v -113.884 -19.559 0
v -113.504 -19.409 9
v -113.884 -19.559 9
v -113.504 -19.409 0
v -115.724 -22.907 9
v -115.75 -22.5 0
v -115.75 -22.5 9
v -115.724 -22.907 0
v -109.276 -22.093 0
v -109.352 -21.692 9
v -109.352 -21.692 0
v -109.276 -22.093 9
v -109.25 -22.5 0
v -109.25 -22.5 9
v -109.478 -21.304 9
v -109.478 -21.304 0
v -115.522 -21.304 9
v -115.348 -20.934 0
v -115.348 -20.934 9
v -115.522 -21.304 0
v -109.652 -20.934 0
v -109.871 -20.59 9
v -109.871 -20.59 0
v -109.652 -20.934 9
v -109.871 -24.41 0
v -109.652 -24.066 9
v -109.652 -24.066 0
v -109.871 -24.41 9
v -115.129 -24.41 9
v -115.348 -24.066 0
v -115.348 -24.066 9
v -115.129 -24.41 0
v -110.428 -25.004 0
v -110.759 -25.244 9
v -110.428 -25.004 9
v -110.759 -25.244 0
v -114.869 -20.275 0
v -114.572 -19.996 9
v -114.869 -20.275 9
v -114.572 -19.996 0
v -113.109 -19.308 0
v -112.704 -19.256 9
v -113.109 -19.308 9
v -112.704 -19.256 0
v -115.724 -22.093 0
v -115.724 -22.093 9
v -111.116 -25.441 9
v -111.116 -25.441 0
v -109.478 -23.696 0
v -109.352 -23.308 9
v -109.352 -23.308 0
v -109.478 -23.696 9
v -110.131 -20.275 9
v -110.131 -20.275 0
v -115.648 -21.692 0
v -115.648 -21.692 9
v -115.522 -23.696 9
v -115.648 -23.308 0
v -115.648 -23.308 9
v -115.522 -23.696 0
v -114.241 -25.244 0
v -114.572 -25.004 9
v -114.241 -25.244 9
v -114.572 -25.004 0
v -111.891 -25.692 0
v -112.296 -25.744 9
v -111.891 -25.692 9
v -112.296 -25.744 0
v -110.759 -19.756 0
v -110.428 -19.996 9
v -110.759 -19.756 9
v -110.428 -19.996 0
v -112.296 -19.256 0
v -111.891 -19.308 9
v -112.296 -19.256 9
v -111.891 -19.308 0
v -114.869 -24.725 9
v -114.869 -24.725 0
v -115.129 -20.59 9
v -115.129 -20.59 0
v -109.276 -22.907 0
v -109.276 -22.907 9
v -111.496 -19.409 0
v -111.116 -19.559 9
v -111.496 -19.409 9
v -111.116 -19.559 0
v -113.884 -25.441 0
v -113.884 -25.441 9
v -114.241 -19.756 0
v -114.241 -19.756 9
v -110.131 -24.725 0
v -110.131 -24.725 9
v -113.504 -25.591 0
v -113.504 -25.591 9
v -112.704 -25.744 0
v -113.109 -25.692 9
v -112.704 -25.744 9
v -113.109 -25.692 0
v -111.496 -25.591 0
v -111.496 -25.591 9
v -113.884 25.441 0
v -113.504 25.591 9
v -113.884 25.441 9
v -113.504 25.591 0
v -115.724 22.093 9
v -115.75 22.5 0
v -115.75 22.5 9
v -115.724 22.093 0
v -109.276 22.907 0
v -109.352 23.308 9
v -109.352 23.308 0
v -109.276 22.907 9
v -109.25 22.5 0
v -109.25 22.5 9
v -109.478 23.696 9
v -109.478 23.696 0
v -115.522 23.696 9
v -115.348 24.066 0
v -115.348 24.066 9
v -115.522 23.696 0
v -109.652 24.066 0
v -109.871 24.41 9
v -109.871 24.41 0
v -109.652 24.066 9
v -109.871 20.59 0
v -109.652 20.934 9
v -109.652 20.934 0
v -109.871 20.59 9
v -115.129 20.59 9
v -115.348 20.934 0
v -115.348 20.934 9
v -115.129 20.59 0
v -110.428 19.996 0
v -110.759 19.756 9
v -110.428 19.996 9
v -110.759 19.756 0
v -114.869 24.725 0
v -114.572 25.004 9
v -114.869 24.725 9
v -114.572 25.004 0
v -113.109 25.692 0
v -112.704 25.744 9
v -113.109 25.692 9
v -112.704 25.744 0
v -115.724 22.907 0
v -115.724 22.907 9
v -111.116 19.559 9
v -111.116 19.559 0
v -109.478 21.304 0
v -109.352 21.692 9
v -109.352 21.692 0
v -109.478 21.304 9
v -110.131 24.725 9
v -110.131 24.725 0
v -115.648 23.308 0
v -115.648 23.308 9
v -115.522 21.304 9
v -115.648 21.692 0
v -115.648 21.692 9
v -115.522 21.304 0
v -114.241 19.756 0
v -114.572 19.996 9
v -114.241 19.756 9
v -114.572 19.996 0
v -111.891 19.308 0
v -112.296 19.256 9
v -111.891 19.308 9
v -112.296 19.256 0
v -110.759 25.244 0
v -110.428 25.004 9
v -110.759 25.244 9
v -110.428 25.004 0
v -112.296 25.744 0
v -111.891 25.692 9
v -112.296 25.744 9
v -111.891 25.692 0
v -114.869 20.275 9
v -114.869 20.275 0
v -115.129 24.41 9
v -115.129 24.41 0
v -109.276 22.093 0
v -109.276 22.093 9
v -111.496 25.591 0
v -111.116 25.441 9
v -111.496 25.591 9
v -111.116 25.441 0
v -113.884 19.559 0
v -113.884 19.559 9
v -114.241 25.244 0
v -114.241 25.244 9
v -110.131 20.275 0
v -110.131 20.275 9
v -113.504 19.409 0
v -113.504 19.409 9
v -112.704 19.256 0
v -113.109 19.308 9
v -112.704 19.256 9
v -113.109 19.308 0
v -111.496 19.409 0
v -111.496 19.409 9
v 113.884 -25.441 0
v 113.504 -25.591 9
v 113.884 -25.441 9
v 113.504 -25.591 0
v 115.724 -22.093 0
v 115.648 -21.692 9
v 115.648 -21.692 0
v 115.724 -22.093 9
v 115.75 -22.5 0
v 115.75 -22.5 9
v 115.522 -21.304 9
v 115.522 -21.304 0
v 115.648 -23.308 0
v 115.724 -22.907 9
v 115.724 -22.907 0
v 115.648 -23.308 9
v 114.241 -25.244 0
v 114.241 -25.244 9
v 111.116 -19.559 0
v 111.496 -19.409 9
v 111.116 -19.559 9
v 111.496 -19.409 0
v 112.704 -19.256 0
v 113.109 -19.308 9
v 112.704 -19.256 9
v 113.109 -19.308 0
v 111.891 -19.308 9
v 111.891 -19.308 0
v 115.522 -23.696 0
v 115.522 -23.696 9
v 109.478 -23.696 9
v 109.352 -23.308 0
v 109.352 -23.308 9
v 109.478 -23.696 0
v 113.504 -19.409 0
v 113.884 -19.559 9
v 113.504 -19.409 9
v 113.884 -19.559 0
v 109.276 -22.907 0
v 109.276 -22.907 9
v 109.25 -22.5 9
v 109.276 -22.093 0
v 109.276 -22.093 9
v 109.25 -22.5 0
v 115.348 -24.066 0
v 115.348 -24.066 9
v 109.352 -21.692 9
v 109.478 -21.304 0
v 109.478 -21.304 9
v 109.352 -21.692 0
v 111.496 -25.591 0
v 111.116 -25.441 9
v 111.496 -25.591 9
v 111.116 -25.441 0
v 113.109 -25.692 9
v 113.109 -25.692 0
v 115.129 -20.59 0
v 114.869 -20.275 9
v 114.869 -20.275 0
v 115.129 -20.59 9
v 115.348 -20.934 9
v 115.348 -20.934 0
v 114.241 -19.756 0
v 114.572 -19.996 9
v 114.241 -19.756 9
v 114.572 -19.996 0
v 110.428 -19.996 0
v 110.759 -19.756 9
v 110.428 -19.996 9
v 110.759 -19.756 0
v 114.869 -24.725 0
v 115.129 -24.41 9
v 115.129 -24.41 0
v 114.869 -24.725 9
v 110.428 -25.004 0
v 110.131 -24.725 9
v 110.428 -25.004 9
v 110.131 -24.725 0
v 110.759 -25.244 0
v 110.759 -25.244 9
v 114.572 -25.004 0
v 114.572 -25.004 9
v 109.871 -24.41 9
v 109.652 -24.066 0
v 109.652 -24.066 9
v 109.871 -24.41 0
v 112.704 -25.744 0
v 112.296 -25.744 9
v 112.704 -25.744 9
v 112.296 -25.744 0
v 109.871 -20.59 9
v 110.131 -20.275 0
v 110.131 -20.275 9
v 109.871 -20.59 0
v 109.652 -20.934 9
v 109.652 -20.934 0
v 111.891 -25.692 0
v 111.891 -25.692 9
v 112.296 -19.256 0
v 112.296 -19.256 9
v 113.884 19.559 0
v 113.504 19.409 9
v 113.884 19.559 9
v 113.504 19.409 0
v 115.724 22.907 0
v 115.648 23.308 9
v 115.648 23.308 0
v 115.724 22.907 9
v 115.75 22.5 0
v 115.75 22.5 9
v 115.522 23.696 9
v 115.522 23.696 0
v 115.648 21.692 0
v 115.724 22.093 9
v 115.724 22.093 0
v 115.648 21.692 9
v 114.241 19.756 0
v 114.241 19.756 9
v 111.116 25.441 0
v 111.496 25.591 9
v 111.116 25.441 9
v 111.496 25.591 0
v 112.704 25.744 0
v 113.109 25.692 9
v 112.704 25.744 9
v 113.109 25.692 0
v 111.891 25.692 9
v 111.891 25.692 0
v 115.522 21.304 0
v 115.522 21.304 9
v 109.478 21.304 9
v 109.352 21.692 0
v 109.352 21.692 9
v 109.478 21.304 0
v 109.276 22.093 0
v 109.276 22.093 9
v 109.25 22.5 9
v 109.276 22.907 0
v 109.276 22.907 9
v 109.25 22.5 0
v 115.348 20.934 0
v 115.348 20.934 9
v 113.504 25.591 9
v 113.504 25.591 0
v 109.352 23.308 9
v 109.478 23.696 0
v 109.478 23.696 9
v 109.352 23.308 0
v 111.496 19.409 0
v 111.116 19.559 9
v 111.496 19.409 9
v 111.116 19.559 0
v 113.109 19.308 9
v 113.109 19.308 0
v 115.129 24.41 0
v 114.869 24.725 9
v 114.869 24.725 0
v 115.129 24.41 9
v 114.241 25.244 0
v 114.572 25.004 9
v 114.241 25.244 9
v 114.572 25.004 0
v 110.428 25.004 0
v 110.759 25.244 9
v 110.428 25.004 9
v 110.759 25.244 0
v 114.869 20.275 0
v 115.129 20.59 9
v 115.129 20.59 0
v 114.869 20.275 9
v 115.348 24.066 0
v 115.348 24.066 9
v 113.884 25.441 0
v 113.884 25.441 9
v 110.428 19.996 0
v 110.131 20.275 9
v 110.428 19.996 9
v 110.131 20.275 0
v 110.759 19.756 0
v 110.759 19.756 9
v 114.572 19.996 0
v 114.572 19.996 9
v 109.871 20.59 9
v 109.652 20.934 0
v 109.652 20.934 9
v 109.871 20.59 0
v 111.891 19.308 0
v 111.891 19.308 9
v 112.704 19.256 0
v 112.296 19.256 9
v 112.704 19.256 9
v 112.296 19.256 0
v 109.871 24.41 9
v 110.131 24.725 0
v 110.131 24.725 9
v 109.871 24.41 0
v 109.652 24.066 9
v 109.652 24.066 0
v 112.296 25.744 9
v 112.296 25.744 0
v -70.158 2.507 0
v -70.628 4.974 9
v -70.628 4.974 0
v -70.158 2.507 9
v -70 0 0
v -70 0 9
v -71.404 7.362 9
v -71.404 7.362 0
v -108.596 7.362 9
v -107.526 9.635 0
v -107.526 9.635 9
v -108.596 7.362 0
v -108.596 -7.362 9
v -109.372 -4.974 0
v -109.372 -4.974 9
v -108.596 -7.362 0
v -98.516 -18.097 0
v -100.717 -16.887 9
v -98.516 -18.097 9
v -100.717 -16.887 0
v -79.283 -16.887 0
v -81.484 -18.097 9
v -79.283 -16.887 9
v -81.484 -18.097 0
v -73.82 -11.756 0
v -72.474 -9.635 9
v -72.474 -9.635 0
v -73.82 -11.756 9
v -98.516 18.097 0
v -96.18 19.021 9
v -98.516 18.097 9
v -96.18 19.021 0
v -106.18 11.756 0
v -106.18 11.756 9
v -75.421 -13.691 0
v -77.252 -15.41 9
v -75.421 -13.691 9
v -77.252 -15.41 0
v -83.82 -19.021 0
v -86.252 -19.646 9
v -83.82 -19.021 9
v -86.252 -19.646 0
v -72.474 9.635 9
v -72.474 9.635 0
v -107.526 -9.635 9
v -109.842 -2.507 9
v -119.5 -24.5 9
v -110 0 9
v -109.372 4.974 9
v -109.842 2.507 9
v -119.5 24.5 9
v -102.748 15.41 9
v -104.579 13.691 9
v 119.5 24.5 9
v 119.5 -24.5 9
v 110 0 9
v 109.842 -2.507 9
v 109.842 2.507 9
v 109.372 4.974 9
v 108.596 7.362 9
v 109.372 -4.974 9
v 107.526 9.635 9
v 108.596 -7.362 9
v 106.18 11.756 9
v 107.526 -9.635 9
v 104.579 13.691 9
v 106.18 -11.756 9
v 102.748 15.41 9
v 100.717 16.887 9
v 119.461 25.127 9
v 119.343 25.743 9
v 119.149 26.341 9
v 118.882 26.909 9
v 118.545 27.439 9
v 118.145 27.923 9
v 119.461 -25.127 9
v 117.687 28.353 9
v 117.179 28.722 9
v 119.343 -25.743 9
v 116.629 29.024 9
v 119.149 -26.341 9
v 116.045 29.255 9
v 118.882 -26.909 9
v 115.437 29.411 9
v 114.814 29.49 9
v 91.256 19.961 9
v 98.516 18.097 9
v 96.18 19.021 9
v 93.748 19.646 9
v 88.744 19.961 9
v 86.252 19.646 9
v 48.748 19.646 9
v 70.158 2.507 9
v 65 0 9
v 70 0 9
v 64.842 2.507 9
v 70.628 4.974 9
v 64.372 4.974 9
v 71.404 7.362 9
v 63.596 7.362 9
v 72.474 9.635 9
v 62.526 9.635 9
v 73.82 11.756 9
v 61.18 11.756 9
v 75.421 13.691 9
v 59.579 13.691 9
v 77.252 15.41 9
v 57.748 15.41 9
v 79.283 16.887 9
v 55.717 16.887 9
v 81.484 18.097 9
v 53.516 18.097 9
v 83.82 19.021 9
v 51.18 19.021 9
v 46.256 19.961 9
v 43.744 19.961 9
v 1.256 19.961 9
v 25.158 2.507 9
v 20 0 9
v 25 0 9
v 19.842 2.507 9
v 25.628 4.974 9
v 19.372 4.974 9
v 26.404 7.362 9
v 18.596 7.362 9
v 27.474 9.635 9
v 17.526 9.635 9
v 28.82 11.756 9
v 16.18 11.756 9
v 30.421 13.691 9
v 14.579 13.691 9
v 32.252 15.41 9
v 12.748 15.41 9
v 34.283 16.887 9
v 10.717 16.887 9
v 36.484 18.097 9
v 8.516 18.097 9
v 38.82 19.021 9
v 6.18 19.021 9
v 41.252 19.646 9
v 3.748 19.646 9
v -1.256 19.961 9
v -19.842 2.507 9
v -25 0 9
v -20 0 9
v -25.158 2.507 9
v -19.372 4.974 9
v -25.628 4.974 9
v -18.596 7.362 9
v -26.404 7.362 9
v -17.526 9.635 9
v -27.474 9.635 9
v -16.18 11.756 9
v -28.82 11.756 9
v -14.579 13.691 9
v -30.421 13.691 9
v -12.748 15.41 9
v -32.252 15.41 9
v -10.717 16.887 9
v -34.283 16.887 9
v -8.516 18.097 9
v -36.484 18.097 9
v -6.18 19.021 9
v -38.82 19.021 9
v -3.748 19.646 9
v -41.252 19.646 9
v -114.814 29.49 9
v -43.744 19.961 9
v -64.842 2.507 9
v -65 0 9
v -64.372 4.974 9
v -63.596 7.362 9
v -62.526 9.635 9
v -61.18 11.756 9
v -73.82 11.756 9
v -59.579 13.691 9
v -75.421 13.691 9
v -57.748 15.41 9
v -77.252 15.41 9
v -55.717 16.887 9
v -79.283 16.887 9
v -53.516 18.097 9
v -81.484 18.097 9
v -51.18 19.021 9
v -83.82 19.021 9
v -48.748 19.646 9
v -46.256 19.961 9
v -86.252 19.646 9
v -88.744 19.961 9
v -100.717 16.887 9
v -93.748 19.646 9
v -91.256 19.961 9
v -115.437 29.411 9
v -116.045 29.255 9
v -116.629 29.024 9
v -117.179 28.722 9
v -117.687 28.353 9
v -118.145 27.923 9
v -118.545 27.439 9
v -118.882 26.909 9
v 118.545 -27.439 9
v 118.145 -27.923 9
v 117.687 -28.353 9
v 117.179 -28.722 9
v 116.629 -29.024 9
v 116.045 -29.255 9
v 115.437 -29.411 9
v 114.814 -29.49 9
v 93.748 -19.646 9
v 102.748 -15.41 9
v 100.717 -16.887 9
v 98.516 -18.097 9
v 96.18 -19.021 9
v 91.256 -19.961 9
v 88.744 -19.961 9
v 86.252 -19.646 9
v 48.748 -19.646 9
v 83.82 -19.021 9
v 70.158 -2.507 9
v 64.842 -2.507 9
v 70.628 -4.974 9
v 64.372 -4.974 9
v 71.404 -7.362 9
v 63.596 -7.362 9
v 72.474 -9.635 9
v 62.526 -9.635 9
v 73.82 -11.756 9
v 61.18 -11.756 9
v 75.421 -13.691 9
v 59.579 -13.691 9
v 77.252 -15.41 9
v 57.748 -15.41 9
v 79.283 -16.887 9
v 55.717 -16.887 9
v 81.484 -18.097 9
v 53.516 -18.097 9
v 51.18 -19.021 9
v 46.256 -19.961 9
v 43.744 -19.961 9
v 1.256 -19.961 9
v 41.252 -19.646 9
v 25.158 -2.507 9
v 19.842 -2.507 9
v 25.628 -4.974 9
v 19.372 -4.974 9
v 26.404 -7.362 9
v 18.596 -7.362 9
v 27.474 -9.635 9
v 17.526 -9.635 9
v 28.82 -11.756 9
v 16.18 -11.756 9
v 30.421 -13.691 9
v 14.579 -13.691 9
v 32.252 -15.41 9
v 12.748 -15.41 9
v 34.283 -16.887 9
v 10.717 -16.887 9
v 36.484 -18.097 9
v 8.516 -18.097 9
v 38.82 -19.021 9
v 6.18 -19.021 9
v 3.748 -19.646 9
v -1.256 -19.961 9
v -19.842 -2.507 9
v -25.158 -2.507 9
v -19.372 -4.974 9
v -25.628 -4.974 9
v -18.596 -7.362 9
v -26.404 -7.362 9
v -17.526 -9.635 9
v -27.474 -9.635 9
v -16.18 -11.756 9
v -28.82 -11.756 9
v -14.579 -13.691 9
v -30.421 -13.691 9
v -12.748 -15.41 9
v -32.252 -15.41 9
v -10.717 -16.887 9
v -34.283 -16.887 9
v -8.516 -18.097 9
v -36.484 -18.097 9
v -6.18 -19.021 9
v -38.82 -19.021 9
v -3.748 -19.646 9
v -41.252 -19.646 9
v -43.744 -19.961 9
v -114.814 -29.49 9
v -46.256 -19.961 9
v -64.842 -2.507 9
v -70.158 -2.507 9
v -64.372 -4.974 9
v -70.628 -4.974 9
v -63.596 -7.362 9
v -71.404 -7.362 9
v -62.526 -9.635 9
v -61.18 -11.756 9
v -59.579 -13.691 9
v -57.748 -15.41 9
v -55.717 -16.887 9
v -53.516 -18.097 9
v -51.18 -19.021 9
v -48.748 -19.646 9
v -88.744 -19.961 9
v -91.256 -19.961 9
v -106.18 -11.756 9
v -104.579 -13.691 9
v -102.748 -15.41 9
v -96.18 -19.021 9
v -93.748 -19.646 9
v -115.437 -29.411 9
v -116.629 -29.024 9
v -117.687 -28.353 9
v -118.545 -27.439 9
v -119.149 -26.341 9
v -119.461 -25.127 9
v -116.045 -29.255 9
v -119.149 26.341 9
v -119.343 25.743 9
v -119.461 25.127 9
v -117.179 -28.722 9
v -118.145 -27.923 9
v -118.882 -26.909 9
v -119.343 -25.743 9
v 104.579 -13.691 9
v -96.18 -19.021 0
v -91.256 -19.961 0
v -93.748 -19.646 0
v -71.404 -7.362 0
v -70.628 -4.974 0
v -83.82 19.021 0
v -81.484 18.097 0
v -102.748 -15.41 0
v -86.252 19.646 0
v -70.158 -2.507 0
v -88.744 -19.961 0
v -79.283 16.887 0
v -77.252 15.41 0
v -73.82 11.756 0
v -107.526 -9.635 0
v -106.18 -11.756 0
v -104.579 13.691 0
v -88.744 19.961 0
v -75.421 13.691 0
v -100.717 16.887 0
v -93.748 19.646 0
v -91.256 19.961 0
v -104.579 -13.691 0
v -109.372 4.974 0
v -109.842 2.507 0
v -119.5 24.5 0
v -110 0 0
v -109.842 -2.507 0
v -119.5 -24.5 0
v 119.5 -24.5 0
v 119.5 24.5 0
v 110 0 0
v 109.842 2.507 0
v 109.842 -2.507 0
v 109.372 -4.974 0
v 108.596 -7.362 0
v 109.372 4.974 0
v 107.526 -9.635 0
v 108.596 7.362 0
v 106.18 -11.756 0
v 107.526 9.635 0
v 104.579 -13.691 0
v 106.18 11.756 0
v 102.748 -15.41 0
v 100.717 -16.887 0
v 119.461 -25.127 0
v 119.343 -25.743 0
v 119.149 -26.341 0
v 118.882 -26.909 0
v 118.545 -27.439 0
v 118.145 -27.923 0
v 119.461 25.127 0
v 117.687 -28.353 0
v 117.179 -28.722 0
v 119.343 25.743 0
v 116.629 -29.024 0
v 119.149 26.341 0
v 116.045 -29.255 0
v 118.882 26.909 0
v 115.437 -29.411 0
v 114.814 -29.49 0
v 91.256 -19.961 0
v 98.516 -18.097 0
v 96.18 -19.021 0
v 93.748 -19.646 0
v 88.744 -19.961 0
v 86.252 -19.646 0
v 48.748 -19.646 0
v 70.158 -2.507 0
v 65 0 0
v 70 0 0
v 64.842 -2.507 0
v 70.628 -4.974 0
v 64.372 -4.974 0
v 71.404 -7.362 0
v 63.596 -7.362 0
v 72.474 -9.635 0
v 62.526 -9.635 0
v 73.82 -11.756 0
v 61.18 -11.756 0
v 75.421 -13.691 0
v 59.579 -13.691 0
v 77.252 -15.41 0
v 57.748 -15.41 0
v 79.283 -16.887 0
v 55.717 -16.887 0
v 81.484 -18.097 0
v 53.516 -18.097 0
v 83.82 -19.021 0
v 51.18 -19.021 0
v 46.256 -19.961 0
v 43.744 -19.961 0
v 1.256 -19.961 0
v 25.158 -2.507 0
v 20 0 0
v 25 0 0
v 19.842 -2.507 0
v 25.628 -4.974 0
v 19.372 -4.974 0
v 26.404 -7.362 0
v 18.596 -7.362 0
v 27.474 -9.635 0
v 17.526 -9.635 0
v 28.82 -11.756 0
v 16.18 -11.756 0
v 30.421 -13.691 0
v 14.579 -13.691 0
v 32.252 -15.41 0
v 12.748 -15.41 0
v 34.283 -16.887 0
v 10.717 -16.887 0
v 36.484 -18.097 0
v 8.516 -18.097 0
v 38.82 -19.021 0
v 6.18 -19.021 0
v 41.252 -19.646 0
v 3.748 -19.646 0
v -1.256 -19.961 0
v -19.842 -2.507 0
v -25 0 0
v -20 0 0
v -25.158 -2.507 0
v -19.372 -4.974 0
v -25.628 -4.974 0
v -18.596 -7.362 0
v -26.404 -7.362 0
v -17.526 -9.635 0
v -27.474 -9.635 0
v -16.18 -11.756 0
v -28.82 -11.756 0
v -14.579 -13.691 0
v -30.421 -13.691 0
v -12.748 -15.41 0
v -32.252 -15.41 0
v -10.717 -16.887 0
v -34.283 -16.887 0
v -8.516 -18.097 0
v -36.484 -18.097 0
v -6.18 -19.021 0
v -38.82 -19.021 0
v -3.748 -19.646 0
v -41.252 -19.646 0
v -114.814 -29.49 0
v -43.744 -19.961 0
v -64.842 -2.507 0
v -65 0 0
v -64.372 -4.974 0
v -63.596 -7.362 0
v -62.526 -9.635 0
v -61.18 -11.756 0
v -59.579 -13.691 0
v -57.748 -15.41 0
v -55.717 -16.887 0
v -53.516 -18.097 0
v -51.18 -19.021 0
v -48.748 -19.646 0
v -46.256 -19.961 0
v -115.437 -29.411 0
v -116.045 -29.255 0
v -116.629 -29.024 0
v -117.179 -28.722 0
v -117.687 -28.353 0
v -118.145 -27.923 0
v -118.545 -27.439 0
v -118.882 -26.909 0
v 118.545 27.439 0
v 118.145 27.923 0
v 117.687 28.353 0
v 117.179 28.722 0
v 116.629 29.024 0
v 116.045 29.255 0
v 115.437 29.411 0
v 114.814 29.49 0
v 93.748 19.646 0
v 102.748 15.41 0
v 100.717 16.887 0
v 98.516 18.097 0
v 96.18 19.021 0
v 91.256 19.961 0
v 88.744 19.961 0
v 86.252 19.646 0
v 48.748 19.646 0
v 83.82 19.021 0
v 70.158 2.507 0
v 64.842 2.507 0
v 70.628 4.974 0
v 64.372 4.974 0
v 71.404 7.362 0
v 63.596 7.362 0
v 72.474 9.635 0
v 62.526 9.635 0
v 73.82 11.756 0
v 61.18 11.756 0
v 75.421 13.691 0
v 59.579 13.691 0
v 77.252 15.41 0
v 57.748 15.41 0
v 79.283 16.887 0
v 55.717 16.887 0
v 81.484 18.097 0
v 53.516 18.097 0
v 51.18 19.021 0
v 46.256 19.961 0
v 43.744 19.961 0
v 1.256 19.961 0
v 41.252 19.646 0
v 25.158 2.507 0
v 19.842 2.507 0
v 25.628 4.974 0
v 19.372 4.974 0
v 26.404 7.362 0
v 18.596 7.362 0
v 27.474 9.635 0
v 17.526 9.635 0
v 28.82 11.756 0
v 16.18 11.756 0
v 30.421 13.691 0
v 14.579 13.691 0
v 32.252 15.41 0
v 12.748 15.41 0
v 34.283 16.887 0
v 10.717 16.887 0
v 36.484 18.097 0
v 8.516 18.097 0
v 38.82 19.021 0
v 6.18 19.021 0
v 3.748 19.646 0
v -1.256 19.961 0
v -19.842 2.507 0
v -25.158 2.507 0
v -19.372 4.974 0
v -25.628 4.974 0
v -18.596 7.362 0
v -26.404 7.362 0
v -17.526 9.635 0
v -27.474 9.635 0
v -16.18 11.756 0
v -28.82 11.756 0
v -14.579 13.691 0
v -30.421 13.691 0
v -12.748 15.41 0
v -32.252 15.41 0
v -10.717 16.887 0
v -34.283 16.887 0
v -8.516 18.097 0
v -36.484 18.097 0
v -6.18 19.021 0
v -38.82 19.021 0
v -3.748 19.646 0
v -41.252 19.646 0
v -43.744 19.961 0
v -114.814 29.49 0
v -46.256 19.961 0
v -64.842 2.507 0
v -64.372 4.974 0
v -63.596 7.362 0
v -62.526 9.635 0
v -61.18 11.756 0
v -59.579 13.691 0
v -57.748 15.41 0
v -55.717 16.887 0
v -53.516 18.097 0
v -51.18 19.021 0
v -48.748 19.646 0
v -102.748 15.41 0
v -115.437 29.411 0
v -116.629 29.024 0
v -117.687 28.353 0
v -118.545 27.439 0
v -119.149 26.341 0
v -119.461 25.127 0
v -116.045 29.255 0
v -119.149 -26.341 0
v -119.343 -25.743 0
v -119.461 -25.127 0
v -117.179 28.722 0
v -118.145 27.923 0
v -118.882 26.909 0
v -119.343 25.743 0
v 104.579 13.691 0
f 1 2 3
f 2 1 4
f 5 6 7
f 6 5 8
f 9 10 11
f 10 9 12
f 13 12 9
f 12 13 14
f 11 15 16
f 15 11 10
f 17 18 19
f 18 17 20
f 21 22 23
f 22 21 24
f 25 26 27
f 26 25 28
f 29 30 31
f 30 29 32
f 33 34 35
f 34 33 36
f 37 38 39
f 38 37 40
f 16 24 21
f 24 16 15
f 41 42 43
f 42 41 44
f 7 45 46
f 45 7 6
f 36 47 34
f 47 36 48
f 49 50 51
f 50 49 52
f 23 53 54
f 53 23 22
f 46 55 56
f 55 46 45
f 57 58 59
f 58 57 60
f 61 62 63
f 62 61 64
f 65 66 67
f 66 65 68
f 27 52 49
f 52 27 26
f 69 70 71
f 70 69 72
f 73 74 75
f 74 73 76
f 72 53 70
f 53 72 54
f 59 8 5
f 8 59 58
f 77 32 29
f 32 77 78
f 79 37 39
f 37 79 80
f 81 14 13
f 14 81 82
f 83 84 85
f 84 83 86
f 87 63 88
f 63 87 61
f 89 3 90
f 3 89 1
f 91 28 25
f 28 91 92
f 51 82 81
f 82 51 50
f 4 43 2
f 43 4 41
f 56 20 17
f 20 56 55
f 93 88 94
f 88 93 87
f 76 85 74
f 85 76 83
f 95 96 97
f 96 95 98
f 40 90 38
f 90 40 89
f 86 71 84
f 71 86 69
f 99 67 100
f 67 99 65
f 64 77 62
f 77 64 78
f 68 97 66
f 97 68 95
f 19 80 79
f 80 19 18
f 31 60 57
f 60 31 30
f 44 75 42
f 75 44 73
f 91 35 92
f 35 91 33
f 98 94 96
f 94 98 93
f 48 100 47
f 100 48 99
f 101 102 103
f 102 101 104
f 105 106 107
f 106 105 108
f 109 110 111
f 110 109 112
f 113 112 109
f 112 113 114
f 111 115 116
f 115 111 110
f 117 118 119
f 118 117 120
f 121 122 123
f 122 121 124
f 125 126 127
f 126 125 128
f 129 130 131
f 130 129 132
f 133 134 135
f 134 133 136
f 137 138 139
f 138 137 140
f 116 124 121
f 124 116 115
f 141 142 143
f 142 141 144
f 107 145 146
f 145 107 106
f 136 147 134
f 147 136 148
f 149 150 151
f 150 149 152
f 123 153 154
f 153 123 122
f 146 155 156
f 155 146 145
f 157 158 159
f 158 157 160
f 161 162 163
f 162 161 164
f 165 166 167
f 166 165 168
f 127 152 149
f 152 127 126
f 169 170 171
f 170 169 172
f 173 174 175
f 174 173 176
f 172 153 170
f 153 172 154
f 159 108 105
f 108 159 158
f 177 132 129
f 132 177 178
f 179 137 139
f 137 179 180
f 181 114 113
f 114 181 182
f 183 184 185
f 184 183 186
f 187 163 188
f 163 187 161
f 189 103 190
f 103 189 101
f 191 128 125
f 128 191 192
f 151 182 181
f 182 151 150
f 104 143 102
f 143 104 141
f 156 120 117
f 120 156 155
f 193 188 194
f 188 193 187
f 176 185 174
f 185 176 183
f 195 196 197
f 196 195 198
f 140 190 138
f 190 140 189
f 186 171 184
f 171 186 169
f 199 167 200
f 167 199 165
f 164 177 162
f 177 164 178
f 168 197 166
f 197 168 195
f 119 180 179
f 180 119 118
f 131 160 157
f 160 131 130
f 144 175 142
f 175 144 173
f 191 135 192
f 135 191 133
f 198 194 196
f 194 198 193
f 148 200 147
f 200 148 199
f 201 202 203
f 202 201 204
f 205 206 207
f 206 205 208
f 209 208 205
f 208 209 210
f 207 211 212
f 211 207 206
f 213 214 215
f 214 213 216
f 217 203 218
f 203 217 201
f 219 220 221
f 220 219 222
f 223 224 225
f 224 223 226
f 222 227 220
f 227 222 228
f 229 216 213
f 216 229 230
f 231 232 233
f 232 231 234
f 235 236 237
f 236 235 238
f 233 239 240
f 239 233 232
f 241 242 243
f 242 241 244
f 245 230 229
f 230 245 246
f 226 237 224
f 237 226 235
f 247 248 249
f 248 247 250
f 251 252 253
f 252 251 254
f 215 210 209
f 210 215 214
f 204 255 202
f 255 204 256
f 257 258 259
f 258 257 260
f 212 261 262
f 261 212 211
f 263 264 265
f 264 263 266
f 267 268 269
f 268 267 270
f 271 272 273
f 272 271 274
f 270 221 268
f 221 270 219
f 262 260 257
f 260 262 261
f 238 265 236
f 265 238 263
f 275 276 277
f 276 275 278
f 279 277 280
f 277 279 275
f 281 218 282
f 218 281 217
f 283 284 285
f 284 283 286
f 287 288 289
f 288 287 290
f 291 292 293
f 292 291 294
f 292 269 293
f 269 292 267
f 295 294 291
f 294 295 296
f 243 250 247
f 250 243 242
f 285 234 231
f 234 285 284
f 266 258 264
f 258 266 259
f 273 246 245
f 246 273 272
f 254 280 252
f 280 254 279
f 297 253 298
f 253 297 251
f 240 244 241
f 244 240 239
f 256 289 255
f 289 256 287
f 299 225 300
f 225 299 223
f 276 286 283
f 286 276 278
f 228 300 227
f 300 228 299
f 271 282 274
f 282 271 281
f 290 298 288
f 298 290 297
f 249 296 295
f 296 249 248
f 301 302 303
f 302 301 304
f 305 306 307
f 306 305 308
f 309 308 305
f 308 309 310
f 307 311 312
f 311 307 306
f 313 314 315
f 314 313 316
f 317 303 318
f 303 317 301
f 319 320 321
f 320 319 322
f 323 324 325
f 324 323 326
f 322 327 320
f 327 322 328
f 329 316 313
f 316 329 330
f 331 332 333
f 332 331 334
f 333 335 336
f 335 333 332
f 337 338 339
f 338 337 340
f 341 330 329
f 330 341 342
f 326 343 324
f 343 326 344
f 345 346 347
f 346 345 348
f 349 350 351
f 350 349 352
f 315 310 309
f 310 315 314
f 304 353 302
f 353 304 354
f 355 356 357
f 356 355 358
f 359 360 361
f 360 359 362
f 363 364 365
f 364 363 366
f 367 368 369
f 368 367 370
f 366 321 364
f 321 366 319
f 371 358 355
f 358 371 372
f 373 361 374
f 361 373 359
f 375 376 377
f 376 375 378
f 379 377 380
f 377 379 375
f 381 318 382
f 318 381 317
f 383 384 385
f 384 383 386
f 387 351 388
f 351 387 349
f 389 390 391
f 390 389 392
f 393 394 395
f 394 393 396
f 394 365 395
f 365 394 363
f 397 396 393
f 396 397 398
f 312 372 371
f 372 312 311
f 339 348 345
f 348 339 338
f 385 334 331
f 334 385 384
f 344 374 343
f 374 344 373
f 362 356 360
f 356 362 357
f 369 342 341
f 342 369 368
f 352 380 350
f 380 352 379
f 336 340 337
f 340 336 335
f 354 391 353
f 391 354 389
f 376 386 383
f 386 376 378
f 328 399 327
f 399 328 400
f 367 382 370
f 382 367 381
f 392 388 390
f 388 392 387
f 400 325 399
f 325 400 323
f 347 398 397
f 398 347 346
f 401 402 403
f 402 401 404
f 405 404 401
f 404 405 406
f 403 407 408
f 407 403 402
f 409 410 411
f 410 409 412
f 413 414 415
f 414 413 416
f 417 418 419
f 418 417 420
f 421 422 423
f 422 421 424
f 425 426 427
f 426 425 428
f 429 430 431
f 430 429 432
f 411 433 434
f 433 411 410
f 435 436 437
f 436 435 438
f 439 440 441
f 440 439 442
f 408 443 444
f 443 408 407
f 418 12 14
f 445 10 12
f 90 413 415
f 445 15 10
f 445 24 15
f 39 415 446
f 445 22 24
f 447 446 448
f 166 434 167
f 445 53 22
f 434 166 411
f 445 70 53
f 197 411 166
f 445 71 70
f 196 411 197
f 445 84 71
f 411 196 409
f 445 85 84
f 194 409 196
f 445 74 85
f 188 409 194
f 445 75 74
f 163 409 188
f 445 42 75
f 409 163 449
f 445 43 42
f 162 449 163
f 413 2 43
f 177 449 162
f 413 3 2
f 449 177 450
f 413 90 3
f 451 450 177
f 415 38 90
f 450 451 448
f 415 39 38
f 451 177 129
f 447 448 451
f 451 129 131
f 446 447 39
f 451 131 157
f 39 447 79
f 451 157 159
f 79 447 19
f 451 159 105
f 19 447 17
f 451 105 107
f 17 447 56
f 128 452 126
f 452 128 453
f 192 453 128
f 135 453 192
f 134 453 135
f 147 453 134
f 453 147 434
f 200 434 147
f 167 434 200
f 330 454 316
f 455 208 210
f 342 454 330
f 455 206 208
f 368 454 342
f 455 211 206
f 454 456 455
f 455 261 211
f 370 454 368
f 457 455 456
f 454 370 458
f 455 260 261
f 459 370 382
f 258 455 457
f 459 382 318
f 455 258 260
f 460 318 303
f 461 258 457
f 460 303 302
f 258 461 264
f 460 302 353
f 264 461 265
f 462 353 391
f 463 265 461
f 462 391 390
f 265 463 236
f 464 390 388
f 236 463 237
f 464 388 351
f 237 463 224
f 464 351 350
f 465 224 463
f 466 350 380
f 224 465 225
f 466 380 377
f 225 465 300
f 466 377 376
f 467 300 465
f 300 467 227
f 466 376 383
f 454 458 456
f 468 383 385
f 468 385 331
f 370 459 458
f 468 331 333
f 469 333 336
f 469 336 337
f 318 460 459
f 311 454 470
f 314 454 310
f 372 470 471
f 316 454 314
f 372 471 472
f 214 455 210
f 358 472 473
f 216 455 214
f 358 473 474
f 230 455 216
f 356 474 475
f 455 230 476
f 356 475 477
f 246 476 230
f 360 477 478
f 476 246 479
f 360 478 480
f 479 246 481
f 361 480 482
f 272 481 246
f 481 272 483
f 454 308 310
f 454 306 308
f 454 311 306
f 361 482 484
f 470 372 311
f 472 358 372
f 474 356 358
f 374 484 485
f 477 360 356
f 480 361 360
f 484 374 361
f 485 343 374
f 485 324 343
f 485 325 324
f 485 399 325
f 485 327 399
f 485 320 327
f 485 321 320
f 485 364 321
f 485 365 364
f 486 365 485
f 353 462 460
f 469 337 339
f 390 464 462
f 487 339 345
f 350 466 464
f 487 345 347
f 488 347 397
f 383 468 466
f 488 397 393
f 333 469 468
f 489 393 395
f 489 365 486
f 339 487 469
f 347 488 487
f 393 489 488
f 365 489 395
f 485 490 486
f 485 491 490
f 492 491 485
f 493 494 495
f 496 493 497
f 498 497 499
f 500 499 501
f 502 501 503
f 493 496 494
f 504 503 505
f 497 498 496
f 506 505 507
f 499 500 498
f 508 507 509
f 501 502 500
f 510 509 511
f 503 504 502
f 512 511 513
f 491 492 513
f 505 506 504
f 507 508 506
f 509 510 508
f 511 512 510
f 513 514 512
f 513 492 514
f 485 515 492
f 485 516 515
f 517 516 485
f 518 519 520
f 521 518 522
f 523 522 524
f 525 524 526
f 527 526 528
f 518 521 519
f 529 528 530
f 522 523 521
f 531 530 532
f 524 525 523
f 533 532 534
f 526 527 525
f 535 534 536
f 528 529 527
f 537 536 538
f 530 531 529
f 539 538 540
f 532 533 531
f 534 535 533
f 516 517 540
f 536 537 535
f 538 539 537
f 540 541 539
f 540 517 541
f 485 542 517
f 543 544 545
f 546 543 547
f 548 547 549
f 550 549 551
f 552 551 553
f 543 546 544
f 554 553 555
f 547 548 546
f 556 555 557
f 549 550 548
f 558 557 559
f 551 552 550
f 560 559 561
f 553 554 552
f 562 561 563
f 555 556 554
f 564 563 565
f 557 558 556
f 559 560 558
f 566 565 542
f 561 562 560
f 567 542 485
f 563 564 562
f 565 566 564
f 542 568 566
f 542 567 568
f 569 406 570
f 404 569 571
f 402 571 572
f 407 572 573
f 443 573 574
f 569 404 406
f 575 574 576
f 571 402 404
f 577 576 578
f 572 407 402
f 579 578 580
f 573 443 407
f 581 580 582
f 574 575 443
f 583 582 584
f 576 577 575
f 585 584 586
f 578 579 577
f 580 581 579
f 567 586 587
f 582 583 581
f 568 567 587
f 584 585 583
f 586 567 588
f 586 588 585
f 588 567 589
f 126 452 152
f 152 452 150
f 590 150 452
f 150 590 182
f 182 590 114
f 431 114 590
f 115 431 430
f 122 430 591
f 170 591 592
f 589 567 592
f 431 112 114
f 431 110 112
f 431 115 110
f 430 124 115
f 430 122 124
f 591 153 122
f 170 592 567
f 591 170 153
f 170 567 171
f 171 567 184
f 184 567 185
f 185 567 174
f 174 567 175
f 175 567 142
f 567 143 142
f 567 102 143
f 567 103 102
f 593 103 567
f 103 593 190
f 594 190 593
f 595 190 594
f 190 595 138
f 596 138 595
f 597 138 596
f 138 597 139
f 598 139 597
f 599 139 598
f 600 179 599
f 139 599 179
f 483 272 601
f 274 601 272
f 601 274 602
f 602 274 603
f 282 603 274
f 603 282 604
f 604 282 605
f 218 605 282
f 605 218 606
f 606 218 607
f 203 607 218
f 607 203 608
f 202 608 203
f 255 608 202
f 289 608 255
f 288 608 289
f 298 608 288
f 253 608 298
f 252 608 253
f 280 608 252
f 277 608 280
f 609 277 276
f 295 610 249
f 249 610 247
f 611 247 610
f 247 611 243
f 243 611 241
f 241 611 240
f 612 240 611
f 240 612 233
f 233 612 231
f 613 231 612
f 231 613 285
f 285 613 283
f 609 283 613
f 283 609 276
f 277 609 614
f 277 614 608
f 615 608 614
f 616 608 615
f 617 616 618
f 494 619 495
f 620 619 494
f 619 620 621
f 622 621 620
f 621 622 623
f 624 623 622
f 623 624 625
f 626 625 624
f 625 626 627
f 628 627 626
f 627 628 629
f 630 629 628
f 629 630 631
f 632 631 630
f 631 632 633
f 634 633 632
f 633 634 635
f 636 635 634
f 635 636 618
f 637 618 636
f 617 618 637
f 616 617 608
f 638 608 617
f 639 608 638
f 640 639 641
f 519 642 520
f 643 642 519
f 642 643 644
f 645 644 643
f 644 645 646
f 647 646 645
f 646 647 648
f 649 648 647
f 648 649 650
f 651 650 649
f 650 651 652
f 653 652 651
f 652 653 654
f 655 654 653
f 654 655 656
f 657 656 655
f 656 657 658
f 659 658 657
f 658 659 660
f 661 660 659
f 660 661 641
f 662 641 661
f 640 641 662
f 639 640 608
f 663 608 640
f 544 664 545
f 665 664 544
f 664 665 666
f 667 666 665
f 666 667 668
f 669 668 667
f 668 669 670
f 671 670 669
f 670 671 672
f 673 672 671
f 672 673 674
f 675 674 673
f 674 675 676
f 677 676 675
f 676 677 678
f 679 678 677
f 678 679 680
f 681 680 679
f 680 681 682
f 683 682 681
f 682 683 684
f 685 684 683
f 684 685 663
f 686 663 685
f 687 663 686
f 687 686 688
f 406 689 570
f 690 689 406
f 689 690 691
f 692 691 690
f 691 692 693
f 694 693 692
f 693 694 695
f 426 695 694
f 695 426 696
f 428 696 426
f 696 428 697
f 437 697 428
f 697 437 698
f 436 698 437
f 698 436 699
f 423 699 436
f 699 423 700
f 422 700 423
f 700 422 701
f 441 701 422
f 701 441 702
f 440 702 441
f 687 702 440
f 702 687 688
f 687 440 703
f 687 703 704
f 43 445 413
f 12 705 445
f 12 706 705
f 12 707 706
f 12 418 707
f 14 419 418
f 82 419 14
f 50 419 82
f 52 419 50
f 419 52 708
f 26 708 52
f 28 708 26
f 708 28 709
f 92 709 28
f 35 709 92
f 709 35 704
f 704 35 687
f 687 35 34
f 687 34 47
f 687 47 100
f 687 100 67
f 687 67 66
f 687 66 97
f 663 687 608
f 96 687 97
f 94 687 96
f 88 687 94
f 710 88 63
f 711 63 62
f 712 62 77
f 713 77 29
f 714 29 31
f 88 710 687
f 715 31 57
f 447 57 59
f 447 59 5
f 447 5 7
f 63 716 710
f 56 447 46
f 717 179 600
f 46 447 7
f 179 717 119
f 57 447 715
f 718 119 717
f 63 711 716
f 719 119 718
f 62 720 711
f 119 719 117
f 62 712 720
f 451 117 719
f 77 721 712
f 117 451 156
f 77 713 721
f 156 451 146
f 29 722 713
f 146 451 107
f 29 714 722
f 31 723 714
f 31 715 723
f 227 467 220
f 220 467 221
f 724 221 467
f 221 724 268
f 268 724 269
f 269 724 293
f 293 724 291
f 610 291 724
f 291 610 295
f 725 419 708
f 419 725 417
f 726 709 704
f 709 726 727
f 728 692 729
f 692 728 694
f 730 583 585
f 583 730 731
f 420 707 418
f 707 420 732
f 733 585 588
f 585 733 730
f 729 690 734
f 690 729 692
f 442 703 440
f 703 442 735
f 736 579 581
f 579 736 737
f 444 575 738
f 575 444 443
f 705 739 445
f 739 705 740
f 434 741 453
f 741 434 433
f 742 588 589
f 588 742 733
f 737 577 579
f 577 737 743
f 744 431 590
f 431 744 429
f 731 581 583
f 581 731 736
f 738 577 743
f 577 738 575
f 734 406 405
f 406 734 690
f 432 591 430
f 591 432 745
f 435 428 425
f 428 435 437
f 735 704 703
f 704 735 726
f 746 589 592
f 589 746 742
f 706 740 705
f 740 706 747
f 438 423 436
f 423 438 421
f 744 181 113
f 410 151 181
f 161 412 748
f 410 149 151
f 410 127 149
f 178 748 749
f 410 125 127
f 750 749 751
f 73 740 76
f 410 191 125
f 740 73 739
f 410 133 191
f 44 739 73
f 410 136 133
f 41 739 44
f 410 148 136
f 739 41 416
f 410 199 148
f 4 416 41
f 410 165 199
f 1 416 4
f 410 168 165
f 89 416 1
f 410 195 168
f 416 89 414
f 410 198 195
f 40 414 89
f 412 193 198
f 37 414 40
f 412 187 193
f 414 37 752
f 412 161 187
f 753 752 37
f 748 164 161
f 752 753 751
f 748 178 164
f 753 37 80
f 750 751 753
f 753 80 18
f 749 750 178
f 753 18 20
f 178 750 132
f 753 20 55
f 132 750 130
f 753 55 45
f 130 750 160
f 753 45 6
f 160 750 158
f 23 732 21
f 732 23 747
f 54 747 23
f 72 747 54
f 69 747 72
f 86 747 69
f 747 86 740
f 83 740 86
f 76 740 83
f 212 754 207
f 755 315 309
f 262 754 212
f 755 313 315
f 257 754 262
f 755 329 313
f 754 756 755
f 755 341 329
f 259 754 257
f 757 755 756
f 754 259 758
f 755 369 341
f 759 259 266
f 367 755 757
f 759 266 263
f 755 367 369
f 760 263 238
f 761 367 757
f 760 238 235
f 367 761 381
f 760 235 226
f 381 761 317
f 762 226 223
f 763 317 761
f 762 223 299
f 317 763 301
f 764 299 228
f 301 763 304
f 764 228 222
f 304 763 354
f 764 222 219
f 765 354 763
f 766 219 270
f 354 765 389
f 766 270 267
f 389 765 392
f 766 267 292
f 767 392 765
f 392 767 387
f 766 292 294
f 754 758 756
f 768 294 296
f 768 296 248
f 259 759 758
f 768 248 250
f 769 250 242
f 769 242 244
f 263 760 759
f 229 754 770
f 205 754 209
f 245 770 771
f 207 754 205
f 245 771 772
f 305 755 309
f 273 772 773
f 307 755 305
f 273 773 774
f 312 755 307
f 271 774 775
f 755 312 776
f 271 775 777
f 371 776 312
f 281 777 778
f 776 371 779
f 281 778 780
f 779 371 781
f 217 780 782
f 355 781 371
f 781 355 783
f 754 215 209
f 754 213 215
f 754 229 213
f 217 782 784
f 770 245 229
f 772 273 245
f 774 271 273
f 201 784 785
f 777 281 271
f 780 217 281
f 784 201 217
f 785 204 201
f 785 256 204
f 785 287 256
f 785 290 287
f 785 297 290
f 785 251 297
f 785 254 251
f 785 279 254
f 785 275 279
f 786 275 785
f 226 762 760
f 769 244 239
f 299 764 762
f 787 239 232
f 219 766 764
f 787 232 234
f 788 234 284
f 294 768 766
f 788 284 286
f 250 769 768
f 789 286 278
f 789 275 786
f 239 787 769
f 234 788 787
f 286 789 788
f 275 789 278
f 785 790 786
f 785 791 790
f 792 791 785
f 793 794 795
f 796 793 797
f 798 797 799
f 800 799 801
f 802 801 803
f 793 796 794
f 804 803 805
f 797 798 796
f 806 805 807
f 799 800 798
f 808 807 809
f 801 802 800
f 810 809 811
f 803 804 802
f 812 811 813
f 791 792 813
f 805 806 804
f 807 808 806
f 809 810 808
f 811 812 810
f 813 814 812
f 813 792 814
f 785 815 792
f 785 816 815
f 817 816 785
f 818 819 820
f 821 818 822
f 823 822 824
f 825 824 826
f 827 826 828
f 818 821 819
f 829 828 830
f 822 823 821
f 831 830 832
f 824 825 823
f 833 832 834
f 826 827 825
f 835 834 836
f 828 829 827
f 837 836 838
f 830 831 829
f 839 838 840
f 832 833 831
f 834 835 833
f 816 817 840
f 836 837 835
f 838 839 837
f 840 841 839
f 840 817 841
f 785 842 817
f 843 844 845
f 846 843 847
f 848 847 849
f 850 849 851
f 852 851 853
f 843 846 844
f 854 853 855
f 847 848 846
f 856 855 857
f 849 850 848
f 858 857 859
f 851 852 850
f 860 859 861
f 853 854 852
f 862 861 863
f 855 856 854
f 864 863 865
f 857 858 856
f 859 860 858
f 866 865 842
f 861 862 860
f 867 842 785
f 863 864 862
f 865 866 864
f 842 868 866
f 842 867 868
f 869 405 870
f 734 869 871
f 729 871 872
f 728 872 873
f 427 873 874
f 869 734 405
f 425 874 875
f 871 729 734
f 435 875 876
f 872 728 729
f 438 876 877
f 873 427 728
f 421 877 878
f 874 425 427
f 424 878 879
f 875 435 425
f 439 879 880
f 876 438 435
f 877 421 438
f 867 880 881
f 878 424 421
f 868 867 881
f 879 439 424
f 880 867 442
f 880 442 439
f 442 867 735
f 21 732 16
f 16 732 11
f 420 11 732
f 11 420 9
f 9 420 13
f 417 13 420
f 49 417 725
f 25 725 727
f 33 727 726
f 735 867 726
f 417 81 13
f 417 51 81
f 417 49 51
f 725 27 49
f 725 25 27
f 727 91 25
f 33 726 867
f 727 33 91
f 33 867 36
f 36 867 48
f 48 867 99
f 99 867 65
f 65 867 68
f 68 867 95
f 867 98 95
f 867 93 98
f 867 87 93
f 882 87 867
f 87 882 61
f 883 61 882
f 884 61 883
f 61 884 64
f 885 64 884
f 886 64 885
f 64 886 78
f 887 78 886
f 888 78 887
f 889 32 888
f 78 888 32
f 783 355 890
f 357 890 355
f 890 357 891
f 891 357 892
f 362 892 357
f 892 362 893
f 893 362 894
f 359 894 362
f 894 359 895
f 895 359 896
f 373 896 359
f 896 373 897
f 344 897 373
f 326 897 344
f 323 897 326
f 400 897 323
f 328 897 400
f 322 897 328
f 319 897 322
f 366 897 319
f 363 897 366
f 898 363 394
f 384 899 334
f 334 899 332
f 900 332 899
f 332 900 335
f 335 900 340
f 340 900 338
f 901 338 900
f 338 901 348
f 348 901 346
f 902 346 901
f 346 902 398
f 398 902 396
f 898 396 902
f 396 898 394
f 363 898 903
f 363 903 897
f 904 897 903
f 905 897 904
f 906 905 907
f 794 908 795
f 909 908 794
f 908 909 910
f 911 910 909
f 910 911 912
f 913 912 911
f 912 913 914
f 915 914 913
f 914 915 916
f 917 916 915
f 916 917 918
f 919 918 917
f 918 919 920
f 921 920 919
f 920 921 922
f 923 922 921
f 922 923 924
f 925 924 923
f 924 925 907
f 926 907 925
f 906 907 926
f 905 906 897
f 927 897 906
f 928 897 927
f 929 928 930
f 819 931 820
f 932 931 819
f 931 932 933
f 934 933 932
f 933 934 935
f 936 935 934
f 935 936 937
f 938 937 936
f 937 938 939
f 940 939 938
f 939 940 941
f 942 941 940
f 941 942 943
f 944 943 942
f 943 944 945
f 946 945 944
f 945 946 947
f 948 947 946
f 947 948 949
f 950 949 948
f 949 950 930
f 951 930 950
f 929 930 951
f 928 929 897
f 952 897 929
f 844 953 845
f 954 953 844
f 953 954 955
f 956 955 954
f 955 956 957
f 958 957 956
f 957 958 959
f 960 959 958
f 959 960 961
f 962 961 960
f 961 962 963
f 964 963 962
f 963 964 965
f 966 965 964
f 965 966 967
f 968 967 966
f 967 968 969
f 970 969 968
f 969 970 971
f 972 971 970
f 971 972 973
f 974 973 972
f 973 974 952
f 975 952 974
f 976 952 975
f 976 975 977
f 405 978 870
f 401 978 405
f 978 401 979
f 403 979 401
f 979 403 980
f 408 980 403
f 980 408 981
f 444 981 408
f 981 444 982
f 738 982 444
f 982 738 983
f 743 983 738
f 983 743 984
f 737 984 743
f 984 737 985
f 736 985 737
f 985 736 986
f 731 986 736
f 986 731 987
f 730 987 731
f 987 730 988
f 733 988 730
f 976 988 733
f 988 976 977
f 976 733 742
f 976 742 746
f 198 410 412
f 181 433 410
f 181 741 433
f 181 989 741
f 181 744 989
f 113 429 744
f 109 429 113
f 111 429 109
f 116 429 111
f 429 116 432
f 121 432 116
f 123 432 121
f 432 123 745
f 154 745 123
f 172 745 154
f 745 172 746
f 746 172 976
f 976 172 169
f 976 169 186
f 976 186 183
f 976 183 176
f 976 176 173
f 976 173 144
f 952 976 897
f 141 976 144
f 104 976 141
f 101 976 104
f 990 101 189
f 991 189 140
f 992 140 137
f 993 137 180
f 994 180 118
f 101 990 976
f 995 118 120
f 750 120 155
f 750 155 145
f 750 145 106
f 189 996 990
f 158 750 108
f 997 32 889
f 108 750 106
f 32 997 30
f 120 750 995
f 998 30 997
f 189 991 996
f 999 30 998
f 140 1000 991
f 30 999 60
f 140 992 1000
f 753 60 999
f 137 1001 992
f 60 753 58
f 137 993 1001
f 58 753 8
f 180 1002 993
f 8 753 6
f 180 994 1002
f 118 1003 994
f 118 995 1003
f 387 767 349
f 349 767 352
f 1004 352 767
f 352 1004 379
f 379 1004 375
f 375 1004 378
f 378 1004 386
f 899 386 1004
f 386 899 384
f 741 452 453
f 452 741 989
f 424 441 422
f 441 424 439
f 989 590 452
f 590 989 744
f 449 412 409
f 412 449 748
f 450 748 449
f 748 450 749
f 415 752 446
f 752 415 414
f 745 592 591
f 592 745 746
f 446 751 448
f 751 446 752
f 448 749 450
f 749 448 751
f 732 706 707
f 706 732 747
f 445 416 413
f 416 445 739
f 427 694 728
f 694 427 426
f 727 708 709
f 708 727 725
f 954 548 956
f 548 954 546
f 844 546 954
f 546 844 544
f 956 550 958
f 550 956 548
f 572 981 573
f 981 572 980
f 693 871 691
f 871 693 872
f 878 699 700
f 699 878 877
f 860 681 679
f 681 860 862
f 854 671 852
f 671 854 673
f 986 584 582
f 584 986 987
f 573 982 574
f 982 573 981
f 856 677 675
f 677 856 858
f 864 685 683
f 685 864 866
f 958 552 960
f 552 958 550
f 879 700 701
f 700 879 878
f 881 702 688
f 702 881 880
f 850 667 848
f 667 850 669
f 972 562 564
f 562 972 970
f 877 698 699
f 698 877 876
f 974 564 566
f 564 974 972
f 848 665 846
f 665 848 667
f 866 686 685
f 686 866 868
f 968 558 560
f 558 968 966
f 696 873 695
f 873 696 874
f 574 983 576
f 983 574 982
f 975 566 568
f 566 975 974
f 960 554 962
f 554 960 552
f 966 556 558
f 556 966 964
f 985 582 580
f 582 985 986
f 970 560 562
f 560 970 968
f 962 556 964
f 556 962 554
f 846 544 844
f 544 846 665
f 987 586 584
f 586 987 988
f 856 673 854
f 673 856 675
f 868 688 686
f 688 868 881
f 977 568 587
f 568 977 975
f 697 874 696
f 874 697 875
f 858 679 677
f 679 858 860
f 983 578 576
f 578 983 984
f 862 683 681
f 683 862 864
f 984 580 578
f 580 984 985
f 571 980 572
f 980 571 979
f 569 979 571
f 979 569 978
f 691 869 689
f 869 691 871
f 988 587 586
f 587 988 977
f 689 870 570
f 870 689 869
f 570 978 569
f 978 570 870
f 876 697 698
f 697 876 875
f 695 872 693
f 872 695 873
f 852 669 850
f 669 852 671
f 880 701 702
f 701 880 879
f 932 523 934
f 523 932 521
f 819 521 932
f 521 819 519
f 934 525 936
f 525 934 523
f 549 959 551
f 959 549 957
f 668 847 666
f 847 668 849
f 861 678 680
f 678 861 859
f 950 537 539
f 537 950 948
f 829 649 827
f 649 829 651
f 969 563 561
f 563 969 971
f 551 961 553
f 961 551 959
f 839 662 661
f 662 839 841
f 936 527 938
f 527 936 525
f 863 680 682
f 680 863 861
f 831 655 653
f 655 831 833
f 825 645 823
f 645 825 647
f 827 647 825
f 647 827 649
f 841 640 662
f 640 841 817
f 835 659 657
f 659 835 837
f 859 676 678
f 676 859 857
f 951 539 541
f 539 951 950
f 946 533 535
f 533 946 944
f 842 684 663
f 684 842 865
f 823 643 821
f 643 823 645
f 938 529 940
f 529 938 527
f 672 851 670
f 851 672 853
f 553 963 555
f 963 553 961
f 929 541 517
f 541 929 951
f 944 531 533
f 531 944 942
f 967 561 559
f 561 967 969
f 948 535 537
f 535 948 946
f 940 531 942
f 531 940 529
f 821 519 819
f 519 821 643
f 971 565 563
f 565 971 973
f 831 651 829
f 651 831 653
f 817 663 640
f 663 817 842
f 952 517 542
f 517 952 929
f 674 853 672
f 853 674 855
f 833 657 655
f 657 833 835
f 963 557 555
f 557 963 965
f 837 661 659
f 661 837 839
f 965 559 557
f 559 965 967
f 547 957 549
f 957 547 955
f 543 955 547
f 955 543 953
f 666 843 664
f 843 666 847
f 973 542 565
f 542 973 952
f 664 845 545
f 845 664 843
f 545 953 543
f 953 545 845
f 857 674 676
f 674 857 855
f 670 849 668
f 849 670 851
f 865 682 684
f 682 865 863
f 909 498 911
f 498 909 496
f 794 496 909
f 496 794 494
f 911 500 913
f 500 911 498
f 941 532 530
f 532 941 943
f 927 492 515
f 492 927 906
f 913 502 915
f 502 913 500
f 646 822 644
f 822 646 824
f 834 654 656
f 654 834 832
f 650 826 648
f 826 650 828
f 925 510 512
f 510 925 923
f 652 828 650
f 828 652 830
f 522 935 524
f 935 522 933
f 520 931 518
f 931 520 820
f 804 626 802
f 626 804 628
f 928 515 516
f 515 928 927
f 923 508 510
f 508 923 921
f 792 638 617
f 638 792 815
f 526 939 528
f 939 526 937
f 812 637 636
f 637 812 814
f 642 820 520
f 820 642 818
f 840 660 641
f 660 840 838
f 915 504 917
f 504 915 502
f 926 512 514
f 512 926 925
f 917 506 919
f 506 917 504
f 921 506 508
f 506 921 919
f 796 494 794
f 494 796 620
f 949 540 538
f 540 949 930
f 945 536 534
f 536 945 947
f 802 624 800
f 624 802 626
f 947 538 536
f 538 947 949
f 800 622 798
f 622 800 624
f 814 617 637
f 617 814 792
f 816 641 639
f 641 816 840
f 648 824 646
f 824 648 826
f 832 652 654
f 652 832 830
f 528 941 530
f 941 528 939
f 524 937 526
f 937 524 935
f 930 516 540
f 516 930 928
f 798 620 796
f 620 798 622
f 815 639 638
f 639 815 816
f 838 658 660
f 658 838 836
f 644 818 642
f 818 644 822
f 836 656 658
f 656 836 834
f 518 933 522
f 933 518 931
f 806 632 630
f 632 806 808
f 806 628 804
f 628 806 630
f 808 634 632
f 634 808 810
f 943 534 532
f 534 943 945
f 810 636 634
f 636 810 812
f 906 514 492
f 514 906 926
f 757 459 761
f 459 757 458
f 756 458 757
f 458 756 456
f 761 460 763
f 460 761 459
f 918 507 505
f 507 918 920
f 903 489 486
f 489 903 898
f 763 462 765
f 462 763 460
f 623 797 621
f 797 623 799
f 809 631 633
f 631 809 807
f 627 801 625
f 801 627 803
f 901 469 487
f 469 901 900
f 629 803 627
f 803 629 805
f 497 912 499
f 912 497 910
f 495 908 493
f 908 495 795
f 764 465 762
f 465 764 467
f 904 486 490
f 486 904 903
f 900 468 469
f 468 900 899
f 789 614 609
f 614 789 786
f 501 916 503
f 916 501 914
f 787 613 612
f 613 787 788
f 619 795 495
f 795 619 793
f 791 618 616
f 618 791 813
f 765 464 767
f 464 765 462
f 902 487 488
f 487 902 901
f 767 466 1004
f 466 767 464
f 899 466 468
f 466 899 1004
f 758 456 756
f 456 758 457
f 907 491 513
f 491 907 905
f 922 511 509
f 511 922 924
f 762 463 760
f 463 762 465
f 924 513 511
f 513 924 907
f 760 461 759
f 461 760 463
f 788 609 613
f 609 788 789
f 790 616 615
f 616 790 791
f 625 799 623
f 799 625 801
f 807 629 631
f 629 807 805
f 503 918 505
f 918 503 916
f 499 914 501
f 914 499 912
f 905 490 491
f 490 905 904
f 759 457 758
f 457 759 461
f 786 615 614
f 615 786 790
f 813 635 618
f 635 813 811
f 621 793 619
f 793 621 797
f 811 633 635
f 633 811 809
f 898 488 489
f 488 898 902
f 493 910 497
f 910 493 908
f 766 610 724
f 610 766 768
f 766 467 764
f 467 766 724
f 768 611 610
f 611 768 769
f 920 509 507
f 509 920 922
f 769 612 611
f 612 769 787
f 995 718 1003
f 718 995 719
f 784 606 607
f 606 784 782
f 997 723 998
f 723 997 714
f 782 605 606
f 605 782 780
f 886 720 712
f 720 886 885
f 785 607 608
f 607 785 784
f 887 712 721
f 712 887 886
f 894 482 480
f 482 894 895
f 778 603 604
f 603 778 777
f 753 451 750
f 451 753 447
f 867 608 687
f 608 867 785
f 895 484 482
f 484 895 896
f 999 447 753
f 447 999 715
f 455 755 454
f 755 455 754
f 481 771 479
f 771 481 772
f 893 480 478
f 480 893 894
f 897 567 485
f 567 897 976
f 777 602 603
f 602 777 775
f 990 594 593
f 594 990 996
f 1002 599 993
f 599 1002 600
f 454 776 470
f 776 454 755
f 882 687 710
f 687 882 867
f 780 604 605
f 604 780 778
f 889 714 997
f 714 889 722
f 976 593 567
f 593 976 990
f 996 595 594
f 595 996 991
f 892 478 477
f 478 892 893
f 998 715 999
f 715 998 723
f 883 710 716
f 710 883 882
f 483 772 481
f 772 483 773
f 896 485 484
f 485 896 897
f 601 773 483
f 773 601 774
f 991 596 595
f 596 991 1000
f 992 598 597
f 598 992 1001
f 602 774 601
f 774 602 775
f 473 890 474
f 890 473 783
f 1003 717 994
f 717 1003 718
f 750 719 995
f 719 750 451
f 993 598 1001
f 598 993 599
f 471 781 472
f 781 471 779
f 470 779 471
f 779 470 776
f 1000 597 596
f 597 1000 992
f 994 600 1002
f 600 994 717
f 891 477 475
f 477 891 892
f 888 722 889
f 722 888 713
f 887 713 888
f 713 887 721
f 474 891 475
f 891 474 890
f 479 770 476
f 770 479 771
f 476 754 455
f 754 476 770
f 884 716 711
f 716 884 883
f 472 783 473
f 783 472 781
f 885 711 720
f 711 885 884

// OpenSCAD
$fn = 50;

difference() {
	union() {
		hull() {
			translate(v = [-114.5, 24.5, 0]) {
				cylinder(h = 9, r = 5);
			}
			translate(v = [114.5, 24.5, 0]) {
				cylinder(h = 9, r = 5);
			}
			translate(v = [-114.5, -24.5, 0]) {
				cylinder(h = 9, r = 5);
			}
			translate(v = [114.5, -24.5, 0]) {
				cylinder(h = 9, r = 5);
			}
		}
	}
	union() {
		translate(v = [-112.5, -22.5, -100.0]) {
			cylinder(h = 200, r = 3.25);
		}
		translate(v = [-112.5, 22.5, -100.0]) {
			cylinder(h = 200, r = 3.25);
		}
		translate(v = [112.5, -22.5, -100.0]) {
			cylinder(h = 200, r = 3.25);
		}
		translate(v = [112.5, 22.5, -100.0]) {
			cylinder(h = 200, r = 3.25);
		}
		translate(v = [-112.5, -22.5, -100.0]) {
			cylinder(h = 200, r = 1.8);
		}
		translate(v = [-112.5, 22.5, -100.0]) {
			cylinder(h = 200, r = 1.8);
		}
		translate(v = [112.5, -22.5, -100.0]) {
			cylinder(h = 200, r = 1.8);
		}
		translate(v = [112.5, 22.5, -100.0]) {
			cylinder(h = 200, r = 1.8);
		}
		translate(v = [-90.0, 0, 0.0]) {
			cylinder(h = 9, r = 20.0);
		}
		translate(v = [-45.0, 0, 0.0]) {
			cylinder(h = 9, r = 20.0);
		}
		cylinder(h = 9, r = 20.0);
		translate(v = [45.0, 0, 0.0]) {
			cylinder(h = 9, r = 20.0);
		}
		translate(v = [90.0, 0, 0.0]) {
			cylinder(h = 9, r = 20.0);
		}
	}
}
